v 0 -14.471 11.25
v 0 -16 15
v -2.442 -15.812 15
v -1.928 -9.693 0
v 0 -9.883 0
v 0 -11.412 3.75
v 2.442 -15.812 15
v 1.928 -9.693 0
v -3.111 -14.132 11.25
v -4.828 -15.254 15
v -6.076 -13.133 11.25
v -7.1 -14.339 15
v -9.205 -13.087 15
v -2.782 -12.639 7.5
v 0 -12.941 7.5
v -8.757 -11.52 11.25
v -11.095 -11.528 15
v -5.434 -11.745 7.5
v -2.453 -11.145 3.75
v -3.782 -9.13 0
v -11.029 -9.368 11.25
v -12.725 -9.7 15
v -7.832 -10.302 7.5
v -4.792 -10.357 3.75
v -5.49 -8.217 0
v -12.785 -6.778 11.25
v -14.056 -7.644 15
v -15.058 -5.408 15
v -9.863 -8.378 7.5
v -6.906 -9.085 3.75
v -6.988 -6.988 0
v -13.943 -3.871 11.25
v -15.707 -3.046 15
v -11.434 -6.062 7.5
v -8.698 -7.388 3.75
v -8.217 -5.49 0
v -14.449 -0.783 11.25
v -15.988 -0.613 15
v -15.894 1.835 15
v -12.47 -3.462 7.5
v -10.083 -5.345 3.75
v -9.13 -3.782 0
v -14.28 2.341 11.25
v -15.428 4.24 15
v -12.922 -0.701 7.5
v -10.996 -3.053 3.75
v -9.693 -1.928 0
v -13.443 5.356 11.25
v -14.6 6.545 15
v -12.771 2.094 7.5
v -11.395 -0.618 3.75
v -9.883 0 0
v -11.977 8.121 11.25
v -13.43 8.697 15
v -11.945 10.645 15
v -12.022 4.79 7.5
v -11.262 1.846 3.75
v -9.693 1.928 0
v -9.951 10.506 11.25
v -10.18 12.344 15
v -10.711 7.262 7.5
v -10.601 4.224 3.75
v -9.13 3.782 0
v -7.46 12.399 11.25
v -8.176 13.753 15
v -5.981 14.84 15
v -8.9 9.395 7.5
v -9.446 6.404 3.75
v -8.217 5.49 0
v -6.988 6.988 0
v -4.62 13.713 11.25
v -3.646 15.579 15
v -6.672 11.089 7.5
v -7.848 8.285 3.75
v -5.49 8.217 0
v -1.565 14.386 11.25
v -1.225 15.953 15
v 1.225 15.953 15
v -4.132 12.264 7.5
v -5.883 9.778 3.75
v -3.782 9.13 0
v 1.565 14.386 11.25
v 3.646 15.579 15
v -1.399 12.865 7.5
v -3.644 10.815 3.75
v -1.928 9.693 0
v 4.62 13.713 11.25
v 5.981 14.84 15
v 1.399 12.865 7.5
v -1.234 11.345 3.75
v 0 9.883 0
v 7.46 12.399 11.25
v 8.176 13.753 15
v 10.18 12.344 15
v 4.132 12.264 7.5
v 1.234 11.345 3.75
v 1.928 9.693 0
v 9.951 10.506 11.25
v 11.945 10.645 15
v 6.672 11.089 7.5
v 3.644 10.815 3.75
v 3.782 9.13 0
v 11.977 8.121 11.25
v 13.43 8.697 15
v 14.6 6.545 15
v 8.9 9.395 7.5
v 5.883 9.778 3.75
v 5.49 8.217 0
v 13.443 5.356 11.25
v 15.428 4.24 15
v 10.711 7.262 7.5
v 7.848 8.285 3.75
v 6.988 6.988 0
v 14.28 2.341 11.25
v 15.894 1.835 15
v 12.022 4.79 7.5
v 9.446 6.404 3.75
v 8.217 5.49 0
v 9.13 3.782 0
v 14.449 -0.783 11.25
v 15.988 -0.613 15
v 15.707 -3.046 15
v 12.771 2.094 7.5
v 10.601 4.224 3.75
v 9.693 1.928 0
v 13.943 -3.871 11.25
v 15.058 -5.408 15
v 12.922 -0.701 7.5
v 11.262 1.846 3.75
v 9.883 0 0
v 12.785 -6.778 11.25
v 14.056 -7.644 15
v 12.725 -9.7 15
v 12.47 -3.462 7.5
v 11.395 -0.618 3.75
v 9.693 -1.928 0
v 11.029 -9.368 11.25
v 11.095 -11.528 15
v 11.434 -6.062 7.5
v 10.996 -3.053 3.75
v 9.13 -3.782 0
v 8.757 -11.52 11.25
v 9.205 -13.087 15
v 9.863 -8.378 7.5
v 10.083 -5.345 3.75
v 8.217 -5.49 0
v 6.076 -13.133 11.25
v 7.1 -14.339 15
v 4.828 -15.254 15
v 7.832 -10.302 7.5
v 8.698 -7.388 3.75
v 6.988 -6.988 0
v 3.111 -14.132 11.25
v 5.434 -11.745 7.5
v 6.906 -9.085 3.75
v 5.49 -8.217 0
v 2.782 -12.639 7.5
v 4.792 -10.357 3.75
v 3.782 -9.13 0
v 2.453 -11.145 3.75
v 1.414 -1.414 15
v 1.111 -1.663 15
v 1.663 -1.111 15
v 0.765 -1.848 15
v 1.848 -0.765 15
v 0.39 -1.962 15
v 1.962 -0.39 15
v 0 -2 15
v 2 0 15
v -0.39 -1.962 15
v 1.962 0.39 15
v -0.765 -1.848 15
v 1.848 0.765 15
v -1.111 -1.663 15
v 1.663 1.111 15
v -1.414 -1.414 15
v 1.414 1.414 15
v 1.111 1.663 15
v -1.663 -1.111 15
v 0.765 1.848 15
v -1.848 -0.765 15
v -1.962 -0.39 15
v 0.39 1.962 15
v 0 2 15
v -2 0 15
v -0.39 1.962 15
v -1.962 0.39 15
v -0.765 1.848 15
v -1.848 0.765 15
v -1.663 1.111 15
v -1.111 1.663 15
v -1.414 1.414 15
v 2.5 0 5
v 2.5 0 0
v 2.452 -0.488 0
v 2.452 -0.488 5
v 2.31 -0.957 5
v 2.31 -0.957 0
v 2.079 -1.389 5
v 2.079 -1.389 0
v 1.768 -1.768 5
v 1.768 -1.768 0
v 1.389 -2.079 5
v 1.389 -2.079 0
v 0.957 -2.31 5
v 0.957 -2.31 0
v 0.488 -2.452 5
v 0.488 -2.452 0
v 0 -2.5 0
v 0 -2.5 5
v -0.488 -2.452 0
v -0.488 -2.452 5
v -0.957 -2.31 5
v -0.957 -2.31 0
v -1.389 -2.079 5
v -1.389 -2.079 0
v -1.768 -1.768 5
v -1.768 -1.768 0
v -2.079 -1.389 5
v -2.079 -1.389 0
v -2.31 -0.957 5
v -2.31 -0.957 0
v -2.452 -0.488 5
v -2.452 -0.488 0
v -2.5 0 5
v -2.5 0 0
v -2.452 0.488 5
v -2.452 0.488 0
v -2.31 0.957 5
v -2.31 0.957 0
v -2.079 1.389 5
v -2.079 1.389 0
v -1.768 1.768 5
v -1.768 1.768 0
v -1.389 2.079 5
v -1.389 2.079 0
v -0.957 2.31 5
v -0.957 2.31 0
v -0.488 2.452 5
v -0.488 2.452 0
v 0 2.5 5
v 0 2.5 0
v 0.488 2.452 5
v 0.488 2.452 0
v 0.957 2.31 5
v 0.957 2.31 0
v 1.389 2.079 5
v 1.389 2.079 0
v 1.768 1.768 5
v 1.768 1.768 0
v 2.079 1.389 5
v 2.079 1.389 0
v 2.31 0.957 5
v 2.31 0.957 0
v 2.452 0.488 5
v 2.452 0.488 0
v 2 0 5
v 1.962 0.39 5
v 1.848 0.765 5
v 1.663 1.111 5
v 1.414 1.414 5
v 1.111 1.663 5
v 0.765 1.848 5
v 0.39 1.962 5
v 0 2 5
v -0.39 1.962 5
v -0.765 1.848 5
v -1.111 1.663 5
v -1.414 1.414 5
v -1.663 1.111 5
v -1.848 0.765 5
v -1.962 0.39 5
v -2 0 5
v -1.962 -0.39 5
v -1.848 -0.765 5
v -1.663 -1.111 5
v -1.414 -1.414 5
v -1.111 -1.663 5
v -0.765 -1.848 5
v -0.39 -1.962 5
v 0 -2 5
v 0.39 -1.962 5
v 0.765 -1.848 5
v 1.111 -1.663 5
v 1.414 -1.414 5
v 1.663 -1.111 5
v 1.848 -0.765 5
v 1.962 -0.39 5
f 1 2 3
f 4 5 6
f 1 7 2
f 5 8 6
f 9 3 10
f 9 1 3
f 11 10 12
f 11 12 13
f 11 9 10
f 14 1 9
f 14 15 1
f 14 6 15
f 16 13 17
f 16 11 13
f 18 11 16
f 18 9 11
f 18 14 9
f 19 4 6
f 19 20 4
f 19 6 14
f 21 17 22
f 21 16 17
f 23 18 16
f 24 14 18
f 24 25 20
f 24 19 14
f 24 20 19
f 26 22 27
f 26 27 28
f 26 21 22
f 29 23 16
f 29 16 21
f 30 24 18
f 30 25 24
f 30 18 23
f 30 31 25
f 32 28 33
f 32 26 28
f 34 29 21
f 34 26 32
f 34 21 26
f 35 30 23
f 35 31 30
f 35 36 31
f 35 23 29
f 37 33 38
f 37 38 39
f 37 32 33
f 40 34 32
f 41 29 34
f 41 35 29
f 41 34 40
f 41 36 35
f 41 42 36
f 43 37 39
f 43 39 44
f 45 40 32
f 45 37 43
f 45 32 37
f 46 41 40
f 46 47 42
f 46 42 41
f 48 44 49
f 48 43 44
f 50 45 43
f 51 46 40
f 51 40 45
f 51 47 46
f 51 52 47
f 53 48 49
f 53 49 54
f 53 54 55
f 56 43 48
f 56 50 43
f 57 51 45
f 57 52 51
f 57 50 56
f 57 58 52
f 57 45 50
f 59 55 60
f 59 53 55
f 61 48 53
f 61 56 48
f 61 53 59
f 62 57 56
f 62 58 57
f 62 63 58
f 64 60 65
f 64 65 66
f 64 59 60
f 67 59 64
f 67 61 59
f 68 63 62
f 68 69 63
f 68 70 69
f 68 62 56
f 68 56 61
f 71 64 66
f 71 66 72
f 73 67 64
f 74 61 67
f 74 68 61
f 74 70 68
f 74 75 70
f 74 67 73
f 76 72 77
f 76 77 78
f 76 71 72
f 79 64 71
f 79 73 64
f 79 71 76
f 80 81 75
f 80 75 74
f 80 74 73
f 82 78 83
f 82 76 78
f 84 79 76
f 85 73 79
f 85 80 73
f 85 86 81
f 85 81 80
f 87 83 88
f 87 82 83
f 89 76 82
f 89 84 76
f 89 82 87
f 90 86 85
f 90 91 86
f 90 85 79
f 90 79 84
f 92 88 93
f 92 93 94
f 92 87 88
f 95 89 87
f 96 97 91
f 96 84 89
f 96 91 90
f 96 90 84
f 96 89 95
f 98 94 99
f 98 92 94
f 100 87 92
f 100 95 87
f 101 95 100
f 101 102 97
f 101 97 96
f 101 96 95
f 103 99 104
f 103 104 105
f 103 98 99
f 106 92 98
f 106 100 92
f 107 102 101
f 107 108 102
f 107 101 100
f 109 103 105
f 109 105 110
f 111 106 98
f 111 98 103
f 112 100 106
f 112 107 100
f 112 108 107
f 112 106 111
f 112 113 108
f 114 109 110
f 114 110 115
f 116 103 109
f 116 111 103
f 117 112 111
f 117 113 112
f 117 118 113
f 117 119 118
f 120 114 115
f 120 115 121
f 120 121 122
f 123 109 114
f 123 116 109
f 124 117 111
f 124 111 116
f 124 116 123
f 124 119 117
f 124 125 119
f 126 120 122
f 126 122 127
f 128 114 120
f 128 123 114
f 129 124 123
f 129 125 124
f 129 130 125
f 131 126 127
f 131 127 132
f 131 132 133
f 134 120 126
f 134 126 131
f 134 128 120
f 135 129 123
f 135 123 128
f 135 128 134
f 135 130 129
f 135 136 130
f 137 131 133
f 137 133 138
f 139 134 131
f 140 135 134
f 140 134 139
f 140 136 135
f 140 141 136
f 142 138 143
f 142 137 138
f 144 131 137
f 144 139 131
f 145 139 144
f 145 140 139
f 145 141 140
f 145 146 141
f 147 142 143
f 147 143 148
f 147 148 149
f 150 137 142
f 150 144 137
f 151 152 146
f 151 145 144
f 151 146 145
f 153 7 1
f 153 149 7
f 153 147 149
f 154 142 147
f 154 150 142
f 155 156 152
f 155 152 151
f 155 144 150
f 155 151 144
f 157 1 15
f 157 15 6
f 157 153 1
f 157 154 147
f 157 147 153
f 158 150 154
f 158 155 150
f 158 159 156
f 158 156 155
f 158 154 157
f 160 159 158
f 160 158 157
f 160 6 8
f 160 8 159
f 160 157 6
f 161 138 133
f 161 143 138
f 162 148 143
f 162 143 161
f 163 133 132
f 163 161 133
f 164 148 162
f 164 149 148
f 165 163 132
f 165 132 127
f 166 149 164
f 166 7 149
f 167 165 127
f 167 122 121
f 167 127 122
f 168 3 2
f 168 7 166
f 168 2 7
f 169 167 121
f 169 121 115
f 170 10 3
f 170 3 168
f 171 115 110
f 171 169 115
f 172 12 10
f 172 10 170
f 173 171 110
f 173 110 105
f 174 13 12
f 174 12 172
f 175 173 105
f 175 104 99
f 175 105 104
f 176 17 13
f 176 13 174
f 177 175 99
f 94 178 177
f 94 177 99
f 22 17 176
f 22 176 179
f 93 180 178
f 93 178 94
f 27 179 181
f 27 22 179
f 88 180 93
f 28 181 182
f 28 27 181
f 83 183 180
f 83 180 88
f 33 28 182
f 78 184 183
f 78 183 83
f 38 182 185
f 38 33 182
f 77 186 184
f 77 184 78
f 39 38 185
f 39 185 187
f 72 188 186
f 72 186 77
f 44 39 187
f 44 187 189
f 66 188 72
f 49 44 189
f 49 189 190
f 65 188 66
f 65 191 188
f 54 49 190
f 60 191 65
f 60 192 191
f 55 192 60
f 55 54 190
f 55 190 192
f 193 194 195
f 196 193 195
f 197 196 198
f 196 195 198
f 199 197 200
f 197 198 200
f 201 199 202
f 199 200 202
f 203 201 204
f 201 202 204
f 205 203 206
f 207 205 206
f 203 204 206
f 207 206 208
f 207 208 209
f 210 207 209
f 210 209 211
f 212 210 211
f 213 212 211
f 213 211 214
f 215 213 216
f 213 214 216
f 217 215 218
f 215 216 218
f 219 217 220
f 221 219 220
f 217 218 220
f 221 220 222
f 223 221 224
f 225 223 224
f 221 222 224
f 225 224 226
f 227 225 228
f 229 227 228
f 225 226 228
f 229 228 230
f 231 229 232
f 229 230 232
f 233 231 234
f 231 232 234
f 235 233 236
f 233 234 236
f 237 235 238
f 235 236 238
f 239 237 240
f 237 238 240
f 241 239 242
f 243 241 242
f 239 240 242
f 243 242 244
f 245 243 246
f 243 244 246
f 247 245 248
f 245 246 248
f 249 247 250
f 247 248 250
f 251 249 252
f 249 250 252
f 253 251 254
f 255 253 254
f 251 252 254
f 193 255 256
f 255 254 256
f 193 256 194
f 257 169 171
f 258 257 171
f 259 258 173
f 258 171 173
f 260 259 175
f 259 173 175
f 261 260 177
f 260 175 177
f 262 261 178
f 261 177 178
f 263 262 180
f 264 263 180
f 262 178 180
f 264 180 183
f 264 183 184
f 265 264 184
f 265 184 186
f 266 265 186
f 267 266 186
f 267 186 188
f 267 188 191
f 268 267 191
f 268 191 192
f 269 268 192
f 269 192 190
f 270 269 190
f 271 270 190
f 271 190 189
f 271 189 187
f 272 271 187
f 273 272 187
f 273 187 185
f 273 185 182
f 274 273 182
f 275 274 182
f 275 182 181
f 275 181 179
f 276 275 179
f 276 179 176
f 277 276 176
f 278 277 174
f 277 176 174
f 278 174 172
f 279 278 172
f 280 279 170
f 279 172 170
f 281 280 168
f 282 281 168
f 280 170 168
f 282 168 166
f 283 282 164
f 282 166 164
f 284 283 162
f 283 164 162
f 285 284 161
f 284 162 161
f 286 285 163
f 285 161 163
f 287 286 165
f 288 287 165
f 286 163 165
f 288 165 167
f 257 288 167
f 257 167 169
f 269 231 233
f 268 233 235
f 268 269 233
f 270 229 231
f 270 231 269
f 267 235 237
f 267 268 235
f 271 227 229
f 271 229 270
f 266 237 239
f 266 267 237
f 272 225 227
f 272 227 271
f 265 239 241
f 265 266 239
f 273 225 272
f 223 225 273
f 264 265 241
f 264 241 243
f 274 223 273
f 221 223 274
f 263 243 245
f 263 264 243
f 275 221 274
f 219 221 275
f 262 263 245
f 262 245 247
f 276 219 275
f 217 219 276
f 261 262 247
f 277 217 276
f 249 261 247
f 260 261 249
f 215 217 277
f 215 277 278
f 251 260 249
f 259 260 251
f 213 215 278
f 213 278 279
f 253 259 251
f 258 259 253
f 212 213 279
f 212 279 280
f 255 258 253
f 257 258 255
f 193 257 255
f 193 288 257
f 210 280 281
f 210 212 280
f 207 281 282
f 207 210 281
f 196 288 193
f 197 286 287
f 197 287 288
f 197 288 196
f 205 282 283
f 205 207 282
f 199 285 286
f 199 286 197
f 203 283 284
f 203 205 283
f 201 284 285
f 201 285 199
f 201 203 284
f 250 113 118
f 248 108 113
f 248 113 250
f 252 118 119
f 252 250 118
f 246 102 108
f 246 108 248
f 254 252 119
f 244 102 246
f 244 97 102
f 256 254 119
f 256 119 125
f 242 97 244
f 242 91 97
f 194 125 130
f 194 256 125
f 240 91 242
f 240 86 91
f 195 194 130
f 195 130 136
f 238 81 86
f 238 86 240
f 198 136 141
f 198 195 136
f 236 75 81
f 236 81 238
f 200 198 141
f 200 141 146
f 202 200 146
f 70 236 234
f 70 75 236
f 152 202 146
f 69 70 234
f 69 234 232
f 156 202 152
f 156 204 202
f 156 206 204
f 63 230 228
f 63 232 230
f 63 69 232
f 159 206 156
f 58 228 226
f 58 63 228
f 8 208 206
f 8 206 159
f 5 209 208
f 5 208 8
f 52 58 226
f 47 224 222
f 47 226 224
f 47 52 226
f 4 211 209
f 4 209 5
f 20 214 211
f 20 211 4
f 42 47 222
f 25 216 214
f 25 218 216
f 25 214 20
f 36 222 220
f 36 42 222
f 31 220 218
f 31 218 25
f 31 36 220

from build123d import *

# Parameters (mm, degrees)
F2_R     = 2.5
F3_DEPTH = 5
F4_R     = 2
F5_DEPTH = 25


with BuildPart() as f1:
    # F0 (on Right) → F1 (revolve)
    with BuildSketch(Plane.YZ):
        Polygon((-9.882553, 0), (0, 0), (0, 15), (-16, 15), align=None)
    revolve(axis=Axis((0, 0, 7.5), (0, 0, -1)))

    # F2 (on face) → F3 (cut)
    with BuildSketch(Plane(origin=(0, 0, 0), x_dir=(1, 0, 0), z_dir=(0, 0, -1))):
        Circle(F2_R)
    extrude(amount=-F3_DEPTH, mode=Mode.SUBTRACT)

    # F4 (on face) → F5 (cut)
    with BuildSketch(Plane.XY.offset(15)):
        Circle(F4_R)
    extrude(amount=-F5_DEPTH, mode=Mode.SUBTRACT)


solid = f1.part
